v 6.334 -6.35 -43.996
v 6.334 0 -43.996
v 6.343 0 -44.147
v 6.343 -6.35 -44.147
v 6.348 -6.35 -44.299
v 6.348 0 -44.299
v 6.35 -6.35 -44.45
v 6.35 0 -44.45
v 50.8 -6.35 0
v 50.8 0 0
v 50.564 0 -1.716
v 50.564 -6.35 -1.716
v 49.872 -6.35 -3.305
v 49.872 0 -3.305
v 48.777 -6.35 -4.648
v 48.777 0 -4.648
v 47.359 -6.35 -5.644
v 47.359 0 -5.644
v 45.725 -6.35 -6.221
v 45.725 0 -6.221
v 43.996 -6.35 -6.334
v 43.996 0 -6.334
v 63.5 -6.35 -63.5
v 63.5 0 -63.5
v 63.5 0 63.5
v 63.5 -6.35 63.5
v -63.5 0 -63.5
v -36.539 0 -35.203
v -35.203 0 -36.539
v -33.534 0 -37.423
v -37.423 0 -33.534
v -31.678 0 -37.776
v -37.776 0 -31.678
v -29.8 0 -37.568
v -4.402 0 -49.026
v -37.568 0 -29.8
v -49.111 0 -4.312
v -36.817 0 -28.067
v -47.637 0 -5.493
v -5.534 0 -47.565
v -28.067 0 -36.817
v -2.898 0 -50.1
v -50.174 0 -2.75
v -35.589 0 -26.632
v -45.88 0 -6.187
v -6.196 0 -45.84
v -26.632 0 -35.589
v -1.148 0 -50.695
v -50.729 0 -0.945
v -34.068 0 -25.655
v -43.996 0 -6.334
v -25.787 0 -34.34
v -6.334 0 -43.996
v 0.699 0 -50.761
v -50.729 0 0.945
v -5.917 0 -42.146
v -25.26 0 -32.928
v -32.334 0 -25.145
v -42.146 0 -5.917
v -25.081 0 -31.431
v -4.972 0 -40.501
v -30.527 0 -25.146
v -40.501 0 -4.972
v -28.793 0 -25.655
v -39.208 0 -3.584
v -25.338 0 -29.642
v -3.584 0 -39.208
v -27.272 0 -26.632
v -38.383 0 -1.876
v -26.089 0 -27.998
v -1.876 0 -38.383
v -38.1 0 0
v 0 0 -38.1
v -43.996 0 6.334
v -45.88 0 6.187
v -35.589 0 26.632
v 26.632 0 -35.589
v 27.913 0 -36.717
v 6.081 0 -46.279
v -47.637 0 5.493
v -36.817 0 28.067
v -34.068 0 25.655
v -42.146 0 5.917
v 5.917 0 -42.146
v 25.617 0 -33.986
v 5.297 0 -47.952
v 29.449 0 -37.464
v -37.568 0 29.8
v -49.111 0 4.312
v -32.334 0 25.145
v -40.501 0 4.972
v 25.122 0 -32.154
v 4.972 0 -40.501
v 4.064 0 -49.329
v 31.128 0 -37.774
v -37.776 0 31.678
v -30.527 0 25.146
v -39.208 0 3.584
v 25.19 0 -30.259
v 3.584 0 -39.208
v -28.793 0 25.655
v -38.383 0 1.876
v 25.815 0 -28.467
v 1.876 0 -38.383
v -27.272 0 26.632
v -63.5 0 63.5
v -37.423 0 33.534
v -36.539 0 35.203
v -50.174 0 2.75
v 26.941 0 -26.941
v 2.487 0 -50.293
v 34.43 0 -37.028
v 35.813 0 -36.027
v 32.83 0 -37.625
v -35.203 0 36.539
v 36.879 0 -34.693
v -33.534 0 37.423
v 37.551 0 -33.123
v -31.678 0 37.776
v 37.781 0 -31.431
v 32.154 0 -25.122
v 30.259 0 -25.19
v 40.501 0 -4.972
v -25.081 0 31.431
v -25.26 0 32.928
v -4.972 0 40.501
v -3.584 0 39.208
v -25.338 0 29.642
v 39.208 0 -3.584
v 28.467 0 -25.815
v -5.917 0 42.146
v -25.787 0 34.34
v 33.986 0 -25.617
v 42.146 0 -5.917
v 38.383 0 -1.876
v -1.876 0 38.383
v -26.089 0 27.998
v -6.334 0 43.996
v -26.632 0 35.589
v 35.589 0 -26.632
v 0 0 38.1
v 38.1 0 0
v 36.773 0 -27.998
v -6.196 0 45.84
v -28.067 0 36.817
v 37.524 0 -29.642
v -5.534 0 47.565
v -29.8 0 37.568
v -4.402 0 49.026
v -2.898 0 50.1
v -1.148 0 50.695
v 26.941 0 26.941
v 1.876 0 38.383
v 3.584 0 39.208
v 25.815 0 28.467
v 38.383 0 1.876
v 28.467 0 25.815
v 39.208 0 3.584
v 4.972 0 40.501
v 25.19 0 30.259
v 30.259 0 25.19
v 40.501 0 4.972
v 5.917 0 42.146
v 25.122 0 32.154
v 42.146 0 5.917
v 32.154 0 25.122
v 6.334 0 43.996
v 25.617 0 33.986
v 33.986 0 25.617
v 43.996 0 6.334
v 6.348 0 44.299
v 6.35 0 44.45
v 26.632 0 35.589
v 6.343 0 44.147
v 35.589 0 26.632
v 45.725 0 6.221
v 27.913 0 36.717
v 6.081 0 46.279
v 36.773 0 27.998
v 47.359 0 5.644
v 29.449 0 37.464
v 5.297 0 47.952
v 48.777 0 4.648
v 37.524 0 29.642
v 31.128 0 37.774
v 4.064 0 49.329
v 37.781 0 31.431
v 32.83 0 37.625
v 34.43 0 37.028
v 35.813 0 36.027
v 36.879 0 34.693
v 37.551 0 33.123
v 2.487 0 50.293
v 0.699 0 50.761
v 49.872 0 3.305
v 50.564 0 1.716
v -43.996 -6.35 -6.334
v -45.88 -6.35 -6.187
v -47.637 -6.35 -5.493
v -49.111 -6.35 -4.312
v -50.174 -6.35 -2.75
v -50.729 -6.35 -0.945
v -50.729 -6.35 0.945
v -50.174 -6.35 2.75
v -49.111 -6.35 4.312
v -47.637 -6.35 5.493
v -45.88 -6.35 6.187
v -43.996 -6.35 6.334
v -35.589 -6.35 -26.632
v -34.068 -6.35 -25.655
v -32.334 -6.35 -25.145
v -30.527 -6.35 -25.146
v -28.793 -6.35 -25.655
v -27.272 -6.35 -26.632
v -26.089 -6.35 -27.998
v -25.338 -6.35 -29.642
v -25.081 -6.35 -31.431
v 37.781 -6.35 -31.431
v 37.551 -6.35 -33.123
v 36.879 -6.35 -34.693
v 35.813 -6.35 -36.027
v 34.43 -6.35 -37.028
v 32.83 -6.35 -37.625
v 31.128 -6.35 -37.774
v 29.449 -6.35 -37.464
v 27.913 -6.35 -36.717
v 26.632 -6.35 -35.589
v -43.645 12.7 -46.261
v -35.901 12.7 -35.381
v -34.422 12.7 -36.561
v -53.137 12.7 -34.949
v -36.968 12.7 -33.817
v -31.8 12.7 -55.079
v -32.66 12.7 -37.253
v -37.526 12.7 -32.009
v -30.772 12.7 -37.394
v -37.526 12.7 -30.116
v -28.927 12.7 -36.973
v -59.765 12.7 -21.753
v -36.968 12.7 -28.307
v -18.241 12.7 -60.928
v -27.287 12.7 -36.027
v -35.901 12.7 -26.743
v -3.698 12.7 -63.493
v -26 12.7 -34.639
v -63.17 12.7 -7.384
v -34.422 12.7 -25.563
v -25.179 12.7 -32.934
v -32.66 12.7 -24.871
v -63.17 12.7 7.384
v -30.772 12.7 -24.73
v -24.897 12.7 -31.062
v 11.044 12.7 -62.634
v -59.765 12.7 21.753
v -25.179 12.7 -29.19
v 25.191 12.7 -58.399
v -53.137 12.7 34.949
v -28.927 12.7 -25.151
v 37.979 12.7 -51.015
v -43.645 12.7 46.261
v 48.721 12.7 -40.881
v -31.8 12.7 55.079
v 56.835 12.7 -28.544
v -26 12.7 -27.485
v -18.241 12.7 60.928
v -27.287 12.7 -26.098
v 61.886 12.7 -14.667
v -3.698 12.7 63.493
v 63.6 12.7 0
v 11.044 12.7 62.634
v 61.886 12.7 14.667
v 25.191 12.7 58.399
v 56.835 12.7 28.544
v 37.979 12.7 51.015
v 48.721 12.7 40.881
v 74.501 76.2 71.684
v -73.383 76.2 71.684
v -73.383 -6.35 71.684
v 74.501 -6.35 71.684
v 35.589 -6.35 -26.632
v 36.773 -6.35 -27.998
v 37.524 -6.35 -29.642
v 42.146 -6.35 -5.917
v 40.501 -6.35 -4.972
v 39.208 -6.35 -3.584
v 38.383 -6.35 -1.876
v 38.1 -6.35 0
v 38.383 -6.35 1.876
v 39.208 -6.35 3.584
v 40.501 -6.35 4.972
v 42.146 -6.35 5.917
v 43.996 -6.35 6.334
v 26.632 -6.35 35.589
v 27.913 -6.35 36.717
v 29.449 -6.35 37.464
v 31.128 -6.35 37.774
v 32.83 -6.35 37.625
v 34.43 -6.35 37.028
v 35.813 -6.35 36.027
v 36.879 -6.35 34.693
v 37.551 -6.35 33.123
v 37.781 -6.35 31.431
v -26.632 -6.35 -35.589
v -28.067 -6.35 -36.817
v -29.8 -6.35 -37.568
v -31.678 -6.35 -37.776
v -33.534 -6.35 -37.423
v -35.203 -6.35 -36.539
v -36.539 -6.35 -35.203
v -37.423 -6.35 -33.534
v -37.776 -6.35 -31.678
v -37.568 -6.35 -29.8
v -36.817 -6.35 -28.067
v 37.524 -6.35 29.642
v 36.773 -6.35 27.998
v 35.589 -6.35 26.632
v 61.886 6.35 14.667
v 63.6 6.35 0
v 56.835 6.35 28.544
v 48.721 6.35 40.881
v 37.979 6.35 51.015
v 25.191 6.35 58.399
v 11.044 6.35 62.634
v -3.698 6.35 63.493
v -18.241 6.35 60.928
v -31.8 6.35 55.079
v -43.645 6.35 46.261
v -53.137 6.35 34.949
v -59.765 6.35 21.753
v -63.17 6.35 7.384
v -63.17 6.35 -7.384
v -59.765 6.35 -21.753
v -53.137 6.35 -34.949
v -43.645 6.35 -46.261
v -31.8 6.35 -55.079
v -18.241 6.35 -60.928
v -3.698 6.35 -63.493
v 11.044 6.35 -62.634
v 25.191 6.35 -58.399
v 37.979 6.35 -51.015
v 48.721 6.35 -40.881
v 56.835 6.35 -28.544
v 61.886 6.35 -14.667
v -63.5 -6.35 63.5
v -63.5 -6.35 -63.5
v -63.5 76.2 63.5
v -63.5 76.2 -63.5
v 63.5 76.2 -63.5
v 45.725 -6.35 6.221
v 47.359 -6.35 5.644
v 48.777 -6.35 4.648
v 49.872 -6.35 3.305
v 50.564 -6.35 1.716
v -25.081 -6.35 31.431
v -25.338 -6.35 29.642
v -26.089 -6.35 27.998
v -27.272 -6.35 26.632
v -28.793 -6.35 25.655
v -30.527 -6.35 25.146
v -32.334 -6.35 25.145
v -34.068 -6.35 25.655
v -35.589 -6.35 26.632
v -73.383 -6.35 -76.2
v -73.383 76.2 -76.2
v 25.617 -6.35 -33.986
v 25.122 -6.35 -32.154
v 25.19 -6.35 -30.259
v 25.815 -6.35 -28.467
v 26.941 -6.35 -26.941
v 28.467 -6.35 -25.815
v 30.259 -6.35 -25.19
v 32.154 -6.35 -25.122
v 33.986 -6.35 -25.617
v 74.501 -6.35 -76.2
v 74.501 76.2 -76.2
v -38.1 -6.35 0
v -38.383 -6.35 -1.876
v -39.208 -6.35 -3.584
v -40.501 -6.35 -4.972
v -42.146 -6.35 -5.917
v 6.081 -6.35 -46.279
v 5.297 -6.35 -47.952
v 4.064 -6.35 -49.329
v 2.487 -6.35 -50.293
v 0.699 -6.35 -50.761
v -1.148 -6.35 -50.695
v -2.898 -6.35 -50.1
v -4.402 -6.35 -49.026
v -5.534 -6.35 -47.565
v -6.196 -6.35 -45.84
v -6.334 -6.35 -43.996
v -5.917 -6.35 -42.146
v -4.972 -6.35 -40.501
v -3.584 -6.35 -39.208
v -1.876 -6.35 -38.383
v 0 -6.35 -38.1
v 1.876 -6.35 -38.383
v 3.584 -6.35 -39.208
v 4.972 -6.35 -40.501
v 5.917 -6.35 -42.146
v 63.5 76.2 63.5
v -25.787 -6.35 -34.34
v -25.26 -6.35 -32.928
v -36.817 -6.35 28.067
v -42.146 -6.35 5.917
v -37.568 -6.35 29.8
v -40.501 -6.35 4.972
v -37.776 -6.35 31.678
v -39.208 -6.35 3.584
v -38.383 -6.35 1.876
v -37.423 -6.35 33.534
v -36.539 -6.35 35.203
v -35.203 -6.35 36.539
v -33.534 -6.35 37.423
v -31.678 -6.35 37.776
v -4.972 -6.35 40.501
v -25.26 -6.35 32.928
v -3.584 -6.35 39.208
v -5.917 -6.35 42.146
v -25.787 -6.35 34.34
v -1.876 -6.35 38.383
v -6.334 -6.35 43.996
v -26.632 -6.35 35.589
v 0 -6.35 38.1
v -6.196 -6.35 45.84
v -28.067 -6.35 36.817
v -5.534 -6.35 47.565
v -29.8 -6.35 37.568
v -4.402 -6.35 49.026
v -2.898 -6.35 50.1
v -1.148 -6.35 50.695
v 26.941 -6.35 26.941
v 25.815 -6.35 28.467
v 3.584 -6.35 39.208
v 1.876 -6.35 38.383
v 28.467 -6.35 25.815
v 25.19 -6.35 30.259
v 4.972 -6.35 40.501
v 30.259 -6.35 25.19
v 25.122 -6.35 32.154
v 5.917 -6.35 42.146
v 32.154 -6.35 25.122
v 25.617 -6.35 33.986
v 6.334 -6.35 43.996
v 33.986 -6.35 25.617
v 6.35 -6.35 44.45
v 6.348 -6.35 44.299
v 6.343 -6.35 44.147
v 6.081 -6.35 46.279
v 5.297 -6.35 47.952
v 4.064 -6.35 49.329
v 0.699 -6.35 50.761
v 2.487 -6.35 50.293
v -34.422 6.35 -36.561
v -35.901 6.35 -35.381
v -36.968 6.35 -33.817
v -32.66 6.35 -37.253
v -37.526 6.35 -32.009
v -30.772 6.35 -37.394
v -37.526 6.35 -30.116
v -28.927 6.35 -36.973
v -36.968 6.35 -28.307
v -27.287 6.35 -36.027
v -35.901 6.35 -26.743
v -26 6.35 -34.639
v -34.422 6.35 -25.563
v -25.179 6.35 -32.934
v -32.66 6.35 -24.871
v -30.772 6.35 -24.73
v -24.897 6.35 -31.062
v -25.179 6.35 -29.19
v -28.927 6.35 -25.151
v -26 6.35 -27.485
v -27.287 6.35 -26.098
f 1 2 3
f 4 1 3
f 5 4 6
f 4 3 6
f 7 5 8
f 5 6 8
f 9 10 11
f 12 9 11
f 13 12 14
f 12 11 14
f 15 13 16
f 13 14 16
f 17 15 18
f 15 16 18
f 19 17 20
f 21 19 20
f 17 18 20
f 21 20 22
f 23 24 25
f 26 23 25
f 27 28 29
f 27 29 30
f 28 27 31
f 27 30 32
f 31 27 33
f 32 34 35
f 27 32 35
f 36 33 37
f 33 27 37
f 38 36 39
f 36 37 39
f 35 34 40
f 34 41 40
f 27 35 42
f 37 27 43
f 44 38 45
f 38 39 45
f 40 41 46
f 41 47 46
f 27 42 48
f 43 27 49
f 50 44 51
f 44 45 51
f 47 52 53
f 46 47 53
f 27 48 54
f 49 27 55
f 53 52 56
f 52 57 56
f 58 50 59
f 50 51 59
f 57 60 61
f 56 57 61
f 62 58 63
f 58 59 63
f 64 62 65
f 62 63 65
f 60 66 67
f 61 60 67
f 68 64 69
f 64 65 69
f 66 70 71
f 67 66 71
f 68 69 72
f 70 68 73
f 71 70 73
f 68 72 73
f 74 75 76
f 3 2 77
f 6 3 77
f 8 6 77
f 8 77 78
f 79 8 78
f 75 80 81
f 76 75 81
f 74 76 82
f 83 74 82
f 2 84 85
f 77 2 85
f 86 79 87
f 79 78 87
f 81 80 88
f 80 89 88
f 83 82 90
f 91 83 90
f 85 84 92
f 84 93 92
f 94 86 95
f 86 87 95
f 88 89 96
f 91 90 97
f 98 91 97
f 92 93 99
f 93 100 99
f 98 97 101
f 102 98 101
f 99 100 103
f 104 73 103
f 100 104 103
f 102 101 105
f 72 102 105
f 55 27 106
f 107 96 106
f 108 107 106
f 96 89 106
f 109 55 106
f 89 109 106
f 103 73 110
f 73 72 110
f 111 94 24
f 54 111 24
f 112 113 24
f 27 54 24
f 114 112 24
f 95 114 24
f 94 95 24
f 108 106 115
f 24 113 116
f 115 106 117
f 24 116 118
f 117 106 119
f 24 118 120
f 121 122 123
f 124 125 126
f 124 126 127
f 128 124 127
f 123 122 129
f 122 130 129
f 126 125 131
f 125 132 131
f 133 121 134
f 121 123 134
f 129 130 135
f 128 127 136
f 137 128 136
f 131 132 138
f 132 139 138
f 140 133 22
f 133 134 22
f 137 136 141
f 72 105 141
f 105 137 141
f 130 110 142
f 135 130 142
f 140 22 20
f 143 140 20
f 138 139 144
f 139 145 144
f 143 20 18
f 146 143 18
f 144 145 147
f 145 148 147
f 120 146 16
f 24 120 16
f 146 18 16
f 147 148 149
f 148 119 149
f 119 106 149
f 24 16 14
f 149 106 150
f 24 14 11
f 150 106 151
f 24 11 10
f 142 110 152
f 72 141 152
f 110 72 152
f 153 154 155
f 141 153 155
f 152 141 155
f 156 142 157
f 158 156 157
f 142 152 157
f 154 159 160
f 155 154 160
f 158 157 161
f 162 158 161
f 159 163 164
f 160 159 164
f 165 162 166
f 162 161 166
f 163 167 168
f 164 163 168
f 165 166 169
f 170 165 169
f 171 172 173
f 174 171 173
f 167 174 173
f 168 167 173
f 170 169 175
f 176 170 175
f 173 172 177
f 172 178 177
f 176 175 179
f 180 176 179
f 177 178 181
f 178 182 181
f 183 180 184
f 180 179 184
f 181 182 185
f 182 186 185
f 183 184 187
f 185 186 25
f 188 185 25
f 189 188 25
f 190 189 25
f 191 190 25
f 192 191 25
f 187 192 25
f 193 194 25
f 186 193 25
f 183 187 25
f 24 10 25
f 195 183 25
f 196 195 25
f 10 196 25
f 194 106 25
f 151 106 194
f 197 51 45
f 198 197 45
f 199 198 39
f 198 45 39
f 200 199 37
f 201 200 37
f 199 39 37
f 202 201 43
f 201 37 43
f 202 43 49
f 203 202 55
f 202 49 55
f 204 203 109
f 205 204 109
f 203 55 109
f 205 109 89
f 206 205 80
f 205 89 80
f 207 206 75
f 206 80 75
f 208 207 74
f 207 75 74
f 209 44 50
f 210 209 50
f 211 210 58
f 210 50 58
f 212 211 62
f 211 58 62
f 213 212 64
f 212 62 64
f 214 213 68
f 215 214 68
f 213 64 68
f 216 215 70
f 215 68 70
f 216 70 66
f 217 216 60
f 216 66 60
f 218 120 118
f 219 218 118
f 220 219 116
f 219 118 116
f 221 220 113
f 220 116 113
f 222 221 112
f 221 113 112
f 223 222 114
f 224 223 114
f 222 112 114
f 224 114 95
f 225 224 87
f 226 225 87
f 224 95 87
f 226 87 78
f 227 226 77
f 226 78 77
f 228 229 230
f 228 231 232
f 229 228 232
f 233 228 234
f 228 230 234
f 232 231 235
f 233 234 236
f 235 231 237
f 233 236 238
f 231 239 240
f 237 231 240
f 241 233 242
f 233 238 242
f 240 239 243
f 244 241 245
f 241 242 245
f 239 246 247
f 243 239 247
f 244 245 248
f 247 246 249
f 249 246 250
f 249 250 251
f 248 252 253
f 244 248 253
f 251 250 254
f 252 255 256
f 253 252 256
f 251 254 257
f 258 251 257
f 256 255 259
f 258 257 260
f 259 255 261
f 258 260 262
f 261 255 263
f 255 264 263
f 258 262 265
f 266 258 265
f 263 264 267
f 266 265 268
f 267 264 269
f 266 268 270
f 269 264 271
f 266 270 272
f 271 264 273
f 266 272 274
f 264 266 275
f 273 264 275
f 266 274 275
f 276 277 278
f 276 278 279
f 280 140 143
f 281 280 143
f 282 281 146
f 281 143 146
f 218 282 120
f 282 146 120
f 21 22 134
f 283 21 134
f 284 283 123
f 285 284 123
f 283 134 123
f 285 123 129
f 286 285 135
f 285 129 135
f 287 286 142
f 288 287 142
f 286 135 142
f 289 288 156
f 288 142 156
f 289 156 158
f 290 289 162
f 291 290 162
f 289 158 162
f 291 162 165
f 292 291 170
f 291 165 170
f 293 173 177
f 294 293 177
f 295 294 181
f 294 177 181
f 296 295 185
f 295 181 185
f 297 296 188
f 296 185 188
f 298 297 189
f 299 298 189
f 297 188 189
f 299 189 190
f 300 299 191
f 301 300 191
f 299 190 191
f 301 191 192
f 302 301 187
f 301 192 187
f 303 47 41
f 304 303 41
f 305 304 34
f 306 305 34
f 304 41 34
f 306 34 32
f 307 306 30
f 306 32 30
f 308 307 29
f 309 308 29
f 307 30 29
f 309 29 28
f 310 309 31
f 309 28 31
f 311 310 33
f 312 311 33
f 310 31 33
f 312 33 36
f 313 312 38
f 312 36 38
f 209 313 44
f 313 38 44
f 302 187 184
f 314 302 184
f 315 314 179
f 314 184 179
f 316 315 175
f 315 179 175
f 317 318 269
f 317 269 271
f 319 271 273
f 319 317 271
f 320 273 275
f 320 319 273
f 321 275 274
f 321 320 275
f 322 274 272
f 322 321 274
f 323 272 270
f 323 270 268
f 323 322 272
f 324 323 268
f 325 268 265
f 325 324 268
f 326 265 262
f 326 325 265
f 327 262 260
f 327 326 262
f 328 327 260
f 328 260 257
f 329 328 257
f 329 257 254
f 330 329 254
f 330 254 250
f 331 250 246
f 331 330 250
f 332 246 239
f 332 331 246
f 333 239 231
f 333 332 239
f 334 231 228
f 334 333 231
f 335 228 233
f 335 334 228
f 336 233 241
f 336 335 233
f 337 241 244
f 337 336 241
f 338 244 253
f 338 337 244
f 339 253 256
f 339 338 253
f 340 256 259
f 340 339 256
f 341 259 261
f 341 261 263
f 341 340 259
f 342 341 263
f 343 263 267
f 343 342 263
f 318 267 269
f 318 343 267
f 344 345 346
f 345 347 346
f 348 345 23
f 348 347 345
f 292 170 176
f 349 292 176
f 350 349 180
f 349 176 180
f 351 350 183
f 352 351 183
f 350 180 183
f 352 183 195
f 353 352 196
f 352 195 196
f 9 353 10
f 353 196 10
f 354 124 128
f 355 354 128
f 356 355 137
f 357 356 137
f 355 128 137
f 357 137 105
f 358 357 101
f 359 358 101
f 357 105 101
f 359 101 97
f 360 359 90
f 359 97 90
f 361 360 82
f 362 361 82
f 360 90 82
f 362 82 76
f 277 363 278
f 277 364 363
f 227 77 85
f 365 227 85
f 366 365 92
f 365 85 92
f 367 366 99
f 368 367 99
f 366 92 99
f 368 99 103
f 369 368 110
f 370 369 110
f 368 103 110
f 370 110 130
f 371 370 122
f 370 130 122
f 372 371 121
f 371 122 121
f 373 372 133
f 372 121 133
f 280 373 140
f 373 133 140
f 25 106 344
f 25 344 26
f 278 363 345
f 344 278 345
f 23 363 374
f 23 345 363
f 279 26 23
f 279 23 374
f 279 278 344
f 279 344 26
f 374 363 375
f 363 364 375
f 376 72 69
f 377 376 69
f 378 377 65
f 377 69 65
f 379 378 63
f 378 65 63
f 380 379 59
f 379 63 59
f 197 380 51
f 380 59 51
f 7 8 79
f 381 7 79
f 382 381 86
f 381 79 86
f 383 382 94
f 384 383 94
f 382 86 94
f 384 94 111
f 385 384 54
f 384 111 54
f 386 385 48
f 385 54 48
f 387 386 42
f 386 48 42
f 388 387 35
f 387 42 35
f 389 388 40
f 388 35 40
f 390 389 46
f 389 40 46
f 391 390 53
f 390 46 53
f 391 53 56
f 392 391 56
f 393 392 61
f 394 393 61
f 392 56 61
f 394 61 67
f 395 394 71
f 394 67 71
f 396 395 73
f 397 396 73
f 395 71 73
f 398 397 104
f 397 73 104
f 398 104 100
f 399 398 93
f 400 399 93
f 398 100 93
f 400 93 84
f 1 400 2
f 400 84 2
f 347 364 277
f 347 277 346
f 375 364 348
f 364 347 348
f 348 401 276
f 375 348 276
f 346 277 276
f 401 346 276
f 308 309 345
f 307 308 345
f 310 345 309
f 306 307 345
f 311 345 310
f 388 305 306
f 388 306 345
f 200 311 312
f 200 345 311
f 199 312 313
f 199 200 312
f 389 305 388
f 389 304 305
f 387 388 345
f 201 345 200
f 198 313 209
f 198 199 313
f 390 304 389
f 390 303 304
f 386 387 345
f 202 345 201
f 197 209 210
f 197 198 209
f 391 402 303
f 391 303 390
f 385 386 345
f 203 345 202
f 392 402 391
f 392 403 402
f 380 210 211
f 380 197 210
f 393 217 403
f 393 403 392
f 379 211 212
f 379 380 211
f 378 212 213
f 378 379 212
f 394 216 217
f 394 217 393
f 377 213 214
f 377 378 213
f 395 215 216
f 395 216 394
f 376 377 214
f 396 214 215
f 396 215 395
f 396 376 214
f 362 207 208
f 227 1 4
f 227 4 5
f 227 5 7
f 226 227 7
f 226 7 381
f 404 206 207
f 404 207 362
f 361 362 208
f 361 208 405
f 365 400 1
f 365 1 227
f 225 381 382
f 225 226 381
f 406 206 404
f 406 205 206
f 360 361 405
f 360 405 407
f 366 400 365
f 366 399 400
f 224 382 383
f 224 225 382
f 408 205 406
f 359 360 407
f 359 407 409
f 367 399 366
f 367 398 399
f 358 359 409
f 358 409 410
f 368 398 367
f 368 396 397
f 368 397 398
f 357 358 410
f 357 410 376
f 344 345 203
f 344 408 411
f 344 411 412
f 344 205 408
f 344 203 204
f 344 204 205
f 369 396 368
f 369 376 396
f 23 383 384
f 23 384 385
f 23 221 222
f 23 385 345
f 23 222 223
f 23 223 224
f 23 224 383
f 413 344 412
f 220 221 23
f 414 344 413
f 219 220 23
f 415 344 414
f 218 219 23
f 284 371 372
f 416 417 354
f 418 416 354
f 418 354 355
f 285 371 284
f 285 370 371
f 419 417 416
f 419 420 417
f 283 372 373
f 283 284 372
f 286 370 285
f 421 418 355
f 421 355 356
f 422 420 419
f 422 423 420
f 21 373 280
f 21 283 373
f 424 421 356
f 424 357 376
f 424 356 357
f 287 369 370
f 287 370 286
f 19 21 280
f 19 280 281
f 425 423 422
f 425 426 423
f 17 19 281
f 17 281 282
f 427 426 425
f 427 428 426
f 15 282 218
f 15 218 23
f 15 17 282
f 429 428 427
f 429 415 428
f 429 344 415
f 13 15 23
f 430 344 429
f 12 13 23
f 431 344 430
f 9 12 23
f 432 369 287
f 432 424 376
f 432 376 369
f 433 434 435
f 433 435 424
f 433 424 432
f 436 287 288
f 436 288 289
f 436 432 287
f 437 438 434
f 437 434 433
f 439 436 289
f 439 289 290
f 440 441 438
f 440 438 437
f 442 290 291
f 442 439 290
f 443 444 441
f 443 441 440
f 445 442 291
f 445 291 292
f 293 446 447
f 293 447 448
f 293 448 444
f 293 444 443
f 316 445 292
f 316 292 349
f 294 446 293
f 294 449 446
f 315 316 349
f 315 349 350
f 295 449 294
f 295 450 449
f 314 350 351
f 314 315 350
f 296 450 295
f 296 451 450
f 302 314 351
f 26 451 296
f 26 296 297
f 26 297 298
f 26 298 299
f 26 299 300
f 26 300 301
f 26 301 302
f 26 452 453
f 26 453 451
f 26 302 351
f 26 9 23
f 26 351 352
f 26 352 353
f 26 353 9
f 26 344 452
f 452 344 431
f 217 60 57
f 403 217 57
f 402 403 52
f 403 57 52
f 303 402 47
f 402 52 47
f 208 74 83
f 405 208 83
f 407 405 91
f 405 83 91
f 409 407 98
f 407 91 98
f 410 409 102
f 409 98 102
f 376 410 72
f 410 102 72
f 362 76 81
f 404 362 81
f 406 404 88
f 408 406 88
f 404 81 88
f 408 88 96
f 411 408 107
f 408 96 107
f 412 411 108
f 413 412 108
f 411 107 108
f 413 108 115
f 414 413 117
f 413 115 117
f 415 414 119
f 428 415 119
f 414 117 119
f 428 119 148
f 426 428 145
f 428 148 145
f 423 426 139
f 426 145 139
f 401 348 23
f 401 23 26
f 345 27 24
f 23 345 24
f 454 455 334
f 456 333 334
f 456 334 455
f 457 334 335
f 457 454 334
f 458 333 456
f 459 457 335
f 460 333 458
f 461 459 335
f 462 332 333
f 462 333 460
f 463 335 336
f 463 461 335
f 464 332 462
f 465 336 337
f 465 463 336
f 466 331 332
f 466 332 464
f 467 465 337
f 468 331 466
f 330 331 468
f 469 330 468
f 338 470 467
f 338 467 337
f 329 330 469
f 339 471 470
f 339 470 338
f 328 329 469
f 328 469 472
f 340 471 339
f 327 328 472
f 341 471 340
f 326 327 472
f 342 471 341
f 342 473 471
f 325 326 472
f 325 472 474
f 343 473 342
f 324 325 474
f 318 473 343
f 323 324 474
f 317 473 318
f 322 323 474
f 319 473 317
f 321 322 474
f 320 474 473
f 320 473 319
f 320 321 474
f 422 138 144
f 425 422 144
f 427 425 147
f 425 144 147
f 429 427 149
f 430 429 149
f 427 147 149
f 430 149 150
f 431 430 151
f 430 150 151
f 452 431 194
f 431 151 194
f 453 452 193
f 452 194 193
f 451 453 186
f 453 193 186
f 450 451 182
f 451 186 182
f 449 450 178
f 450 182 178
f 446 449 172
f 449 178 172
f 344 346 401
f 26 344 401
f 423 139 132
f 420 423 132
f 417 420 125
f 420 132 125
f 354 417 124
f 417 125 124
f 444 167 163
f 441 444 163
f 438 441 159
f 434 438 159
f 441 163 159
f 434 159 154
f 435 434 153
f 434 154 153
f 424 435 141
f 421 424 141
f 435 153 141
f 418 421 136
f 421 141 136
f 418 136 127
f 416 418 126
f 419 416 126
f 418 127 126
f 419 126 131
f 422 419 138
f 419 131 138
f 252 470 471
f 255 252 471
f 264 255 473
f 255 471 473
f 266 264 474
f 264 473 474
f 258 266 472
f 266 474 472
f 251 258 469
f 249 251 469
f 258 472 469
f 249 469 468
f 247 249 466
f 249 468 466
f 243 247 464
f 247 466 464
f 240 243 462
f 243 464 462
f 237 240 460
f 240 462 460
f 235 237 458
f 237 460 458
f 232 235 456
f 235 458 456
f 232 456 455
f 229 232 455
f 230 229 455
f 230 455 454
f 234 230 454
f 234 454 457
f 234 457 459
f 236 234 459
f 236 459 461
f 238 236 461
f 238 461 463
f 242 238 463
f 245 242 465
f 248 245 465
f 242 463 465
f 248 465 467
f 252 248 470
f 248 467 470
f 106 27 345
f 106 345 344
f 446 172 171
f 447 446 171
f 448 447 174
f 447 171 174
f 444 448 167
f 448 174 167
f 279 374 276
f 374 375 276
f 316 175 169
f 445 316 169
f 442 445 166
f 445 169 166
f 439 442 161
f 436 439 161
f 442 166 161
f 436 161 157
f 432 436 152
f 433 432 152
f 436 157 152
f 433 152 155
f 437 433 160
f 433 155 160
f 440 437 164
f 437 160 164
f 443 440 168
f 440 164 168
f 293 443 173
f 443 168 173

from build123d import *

# Parameters (mm, degrees)
F0_W          = 127
F0_H          = 127
F1_DEPTH      = 6.35
F3_R          = 63.6002819842
F3_R_2        = 6.35
F4_DEPTH      = 6.35
F5_W          = 147.884440772
F5_H          = 147.884440772
F5_W_2        = 127
F5_H_2        = 127
F6_DEPTH      = 76.2
F6_DEPTH_BACK = 6.35


with BuildPart() as f1:
    # F0 (on Front) → F1 (new body)
    with BuildSketch(Plane.XZ):
        Rectangle(F0_W, F0_H)
        with BuildLine():
            ThreePointArc((35.5888319955, 26.6315139862), (41.0664452201, 17.0102785686), (43.9964285714, 6.3337803056))
            ThreePointArc((43.9964285714, 6.3337803056), (48.7767956636, 4.6477240974), (50.8, 0))
            ThreePointArc((50.8, 0), (48.7767956636, -4.6477240974), (43.9964285714, -6.3337803056))
            ThreePointArc((43.9964285714, -6.3337803056), (41.0664452201, -17.0102785686), (35.5888319955, -26.6315139862))
            ThreePointArc((35.5888319955, -26.6315139862), (37.206941389, -28.7927522731), (37.7808964237, -31.4308964237))
            ThreePointArc((37.7808964237, -31.4308964237), (33.6497273684, -37.3806266058), (26.6315139862, -35.5888319955))
            ThreePointArc((26.6315139862, -35.5888319955), (17.0102785686, -41.0664452201), (6.3337803056, -43.9964285714))
            ThreePointArc((6.3337803056, -43.9964285714), (6.3459437809, -44.2230693282), (6.35, -44.45))
            ThreePointArc((6.35, -44.45), (-0.2269306718, -50.7959437809), (-6.3337803056, -43.9964285714))
            ThreePointArc((-6.3337803056, -43.9964285714), (-17.0102785686, -41.0664452201), (-26.6315139862, -35.5888319955))
            ThreePointArc((-26.6315139862, -35.5888319955), (-35.9210244843, -35.9210244843), (-35.5888319955, -26.6315139862))
            ThreePointArc((-35.5888319955, -26.6315139862), (-41.0664452201, -17.0102785686), (-43.9964285714, -6.3337803056))
            ThreePointArc((-43.9964285714, -6.3337803056), (-50.8, 0), (-43.9964285714, 6.3337803056))
            ThreePointArc((-43.9964285714, 6.3337803056), (-41.0664452201, 17.0102785686), (-35.5888319955, 26.6315139862))
            ThreePointArc((-35.5888319955, 26.6315139862), (-35.9210244843, 35.9210244843), (-26.6315139862, 35.5888319955))
            ThreePointArc((-26.6315139862, 35.5888319955), (-17.0102785686, 41.0664452201), (-6.3337803056, 43.9964285714))
            ThreePointArc((-6.3337803056, 43.9964285714), (-0.2269306718, 50.7959437809), (6.35, 44.45))
            ThreePointArc((6.35, 44.45), (6.3459437809, 44.2230693282), (6.3337803056, 43.9964285714))
            ThreePointArc((6.3337803056, 43.9964285714), (17.0102785686, 41.0664452201), (26.6315139862, 35.5888319955))
            ThreePointArc((26.6315139862, 35.5888319955), (33.6497273684, 37.3806266058), (37.7808964237, 31.4308964237))
            ThreePointArc((37.7808964237, 31.4308964237), (37.206941389, 28.7927522731), (35.5888319955, 26.6315139862))
        make_face(mode=Mode.SUBTRACT)
        with BuildLine():
            ThreePointArc((43.9964285714, -6.3337803056), (38.1, 0), (43.9964285714, 6.3337803056))
            ThreePointArc((43.9964285714, 6.3337803056), (41.0664452201, 17.0102785686), (35.5888319955, 26.6315139862))
            ThreePointArc((35.5888319955, 26.6315139862), (26.9407683632, 26.9407683632), (26.6315139862, 35.5888319955))
            ThreePointArc((26.6315139862, 35.5888319955), (17.0102785686, 41.0664452201), (6.3337803056, 43.9964285714))
            ThreePointArc((6.3337803056, 43.9964285714), (0, 38.1), (-6.3337803056, 43.9964285714))
            ThreePointArc((-6.3337803056, 43.9964285714), (-17.0102785686, 41.0664452201), (-26.6315139862, 35.5888319955))
            ThreePointArc((-26.6315139862, 35.5888319955), (-25.4811662417, 33.6497273684), (-25.0808964237, 31.4308964237))
            ThreePointArc((-25.0808964237, 31.4308964237), (-28.7927522731, 25.6548514585), (-35.5888319955, 26.6315139862))
            ThreePointArc((-35.5888319955, 26.6315139862), (-41.0664452201, 17.0102785686), (-43.9964285714, 6.3337803056))
            ThreePointArc((-43.9964285714, 6.3337803056), (-39.8022759026, 4.3267956636), (-38.1, 0))
            ThreePointArc((-38.1, 0), (-39.8022759026, -4.3267956636), (-43.9964285714, -6.3337803056))
            ThreePointArc((-43.9964285714, -6.3337803056), (-41.0664452201, -17.0102785686), (-35.5888319955, -26.6315139862))
            ThreePointArc((-35.5888319955, -26.6315139862), (-28.7927522731, -25.6548514585), (-25.0808964237, -31.4308964237))
            ThreePointArc((-25.0808964237, -31.4308964237), (-25.4811662417, -33.6497273684), (-26.6315139862, -35.5888319955))
            ThreePointArc((-26.6315139862, -35.5888319955), (-17.0102785686, -41.0664452201), (-6.3337803056, -43.9964285714))
            ThreePointArc((-6.3337803056, -43.9964285714), (0, -38.1), (6.3337803056, -43.9964285714))
            ThreePointArc((6.3337803056, -43.9964285714), (17.0102785686, -41.0664452201), (26.6315139862, -35.5888319955))
            ThreePointArc((26.6315139862, -35.5888319955), (26.9407683632, -26.9407683632), (35.5888319955, -26.6315139862))
            ThreePointArc((35.5888319955, -26.6315139862), (41.0664452201, -17.0102785686), (43.9964285714, -6.3337803056))
        make_face()
    extrude(amount=F1_DEPTH)


with BuildPart() as f4:
    # F3 (on offset) → F4 (new body)
    with BuildSketch(Plane.XZ.offset(-6.35)):
        Circle(F3_R)
        with Locations((-31.2465413238, -31.0621867478)):
            Circle(F3_R_2, mode=Mode.SUBTRACT)
    extrude(amount=-F4_DEPTH)


with BuildPart() as f6:
    # F5 (on Front) → F6 (new body, two sides)
    with BuildSketch(Plane.XZ) as f6_sk:
        with Locations((0.5592270837, -2.257779614)):
            Rectangle(F5_W, F5_H)
        Rectangle(F5_W_2, F5_H_2, mode=Mode.SUBTRACT)
    extrude(amount=-F6_DEPTH)
    extrude(f6_sk.sketch, amount=F6_DEPTH_BACK)


solid = Compound([f1.part, f4.part, f6.part])
